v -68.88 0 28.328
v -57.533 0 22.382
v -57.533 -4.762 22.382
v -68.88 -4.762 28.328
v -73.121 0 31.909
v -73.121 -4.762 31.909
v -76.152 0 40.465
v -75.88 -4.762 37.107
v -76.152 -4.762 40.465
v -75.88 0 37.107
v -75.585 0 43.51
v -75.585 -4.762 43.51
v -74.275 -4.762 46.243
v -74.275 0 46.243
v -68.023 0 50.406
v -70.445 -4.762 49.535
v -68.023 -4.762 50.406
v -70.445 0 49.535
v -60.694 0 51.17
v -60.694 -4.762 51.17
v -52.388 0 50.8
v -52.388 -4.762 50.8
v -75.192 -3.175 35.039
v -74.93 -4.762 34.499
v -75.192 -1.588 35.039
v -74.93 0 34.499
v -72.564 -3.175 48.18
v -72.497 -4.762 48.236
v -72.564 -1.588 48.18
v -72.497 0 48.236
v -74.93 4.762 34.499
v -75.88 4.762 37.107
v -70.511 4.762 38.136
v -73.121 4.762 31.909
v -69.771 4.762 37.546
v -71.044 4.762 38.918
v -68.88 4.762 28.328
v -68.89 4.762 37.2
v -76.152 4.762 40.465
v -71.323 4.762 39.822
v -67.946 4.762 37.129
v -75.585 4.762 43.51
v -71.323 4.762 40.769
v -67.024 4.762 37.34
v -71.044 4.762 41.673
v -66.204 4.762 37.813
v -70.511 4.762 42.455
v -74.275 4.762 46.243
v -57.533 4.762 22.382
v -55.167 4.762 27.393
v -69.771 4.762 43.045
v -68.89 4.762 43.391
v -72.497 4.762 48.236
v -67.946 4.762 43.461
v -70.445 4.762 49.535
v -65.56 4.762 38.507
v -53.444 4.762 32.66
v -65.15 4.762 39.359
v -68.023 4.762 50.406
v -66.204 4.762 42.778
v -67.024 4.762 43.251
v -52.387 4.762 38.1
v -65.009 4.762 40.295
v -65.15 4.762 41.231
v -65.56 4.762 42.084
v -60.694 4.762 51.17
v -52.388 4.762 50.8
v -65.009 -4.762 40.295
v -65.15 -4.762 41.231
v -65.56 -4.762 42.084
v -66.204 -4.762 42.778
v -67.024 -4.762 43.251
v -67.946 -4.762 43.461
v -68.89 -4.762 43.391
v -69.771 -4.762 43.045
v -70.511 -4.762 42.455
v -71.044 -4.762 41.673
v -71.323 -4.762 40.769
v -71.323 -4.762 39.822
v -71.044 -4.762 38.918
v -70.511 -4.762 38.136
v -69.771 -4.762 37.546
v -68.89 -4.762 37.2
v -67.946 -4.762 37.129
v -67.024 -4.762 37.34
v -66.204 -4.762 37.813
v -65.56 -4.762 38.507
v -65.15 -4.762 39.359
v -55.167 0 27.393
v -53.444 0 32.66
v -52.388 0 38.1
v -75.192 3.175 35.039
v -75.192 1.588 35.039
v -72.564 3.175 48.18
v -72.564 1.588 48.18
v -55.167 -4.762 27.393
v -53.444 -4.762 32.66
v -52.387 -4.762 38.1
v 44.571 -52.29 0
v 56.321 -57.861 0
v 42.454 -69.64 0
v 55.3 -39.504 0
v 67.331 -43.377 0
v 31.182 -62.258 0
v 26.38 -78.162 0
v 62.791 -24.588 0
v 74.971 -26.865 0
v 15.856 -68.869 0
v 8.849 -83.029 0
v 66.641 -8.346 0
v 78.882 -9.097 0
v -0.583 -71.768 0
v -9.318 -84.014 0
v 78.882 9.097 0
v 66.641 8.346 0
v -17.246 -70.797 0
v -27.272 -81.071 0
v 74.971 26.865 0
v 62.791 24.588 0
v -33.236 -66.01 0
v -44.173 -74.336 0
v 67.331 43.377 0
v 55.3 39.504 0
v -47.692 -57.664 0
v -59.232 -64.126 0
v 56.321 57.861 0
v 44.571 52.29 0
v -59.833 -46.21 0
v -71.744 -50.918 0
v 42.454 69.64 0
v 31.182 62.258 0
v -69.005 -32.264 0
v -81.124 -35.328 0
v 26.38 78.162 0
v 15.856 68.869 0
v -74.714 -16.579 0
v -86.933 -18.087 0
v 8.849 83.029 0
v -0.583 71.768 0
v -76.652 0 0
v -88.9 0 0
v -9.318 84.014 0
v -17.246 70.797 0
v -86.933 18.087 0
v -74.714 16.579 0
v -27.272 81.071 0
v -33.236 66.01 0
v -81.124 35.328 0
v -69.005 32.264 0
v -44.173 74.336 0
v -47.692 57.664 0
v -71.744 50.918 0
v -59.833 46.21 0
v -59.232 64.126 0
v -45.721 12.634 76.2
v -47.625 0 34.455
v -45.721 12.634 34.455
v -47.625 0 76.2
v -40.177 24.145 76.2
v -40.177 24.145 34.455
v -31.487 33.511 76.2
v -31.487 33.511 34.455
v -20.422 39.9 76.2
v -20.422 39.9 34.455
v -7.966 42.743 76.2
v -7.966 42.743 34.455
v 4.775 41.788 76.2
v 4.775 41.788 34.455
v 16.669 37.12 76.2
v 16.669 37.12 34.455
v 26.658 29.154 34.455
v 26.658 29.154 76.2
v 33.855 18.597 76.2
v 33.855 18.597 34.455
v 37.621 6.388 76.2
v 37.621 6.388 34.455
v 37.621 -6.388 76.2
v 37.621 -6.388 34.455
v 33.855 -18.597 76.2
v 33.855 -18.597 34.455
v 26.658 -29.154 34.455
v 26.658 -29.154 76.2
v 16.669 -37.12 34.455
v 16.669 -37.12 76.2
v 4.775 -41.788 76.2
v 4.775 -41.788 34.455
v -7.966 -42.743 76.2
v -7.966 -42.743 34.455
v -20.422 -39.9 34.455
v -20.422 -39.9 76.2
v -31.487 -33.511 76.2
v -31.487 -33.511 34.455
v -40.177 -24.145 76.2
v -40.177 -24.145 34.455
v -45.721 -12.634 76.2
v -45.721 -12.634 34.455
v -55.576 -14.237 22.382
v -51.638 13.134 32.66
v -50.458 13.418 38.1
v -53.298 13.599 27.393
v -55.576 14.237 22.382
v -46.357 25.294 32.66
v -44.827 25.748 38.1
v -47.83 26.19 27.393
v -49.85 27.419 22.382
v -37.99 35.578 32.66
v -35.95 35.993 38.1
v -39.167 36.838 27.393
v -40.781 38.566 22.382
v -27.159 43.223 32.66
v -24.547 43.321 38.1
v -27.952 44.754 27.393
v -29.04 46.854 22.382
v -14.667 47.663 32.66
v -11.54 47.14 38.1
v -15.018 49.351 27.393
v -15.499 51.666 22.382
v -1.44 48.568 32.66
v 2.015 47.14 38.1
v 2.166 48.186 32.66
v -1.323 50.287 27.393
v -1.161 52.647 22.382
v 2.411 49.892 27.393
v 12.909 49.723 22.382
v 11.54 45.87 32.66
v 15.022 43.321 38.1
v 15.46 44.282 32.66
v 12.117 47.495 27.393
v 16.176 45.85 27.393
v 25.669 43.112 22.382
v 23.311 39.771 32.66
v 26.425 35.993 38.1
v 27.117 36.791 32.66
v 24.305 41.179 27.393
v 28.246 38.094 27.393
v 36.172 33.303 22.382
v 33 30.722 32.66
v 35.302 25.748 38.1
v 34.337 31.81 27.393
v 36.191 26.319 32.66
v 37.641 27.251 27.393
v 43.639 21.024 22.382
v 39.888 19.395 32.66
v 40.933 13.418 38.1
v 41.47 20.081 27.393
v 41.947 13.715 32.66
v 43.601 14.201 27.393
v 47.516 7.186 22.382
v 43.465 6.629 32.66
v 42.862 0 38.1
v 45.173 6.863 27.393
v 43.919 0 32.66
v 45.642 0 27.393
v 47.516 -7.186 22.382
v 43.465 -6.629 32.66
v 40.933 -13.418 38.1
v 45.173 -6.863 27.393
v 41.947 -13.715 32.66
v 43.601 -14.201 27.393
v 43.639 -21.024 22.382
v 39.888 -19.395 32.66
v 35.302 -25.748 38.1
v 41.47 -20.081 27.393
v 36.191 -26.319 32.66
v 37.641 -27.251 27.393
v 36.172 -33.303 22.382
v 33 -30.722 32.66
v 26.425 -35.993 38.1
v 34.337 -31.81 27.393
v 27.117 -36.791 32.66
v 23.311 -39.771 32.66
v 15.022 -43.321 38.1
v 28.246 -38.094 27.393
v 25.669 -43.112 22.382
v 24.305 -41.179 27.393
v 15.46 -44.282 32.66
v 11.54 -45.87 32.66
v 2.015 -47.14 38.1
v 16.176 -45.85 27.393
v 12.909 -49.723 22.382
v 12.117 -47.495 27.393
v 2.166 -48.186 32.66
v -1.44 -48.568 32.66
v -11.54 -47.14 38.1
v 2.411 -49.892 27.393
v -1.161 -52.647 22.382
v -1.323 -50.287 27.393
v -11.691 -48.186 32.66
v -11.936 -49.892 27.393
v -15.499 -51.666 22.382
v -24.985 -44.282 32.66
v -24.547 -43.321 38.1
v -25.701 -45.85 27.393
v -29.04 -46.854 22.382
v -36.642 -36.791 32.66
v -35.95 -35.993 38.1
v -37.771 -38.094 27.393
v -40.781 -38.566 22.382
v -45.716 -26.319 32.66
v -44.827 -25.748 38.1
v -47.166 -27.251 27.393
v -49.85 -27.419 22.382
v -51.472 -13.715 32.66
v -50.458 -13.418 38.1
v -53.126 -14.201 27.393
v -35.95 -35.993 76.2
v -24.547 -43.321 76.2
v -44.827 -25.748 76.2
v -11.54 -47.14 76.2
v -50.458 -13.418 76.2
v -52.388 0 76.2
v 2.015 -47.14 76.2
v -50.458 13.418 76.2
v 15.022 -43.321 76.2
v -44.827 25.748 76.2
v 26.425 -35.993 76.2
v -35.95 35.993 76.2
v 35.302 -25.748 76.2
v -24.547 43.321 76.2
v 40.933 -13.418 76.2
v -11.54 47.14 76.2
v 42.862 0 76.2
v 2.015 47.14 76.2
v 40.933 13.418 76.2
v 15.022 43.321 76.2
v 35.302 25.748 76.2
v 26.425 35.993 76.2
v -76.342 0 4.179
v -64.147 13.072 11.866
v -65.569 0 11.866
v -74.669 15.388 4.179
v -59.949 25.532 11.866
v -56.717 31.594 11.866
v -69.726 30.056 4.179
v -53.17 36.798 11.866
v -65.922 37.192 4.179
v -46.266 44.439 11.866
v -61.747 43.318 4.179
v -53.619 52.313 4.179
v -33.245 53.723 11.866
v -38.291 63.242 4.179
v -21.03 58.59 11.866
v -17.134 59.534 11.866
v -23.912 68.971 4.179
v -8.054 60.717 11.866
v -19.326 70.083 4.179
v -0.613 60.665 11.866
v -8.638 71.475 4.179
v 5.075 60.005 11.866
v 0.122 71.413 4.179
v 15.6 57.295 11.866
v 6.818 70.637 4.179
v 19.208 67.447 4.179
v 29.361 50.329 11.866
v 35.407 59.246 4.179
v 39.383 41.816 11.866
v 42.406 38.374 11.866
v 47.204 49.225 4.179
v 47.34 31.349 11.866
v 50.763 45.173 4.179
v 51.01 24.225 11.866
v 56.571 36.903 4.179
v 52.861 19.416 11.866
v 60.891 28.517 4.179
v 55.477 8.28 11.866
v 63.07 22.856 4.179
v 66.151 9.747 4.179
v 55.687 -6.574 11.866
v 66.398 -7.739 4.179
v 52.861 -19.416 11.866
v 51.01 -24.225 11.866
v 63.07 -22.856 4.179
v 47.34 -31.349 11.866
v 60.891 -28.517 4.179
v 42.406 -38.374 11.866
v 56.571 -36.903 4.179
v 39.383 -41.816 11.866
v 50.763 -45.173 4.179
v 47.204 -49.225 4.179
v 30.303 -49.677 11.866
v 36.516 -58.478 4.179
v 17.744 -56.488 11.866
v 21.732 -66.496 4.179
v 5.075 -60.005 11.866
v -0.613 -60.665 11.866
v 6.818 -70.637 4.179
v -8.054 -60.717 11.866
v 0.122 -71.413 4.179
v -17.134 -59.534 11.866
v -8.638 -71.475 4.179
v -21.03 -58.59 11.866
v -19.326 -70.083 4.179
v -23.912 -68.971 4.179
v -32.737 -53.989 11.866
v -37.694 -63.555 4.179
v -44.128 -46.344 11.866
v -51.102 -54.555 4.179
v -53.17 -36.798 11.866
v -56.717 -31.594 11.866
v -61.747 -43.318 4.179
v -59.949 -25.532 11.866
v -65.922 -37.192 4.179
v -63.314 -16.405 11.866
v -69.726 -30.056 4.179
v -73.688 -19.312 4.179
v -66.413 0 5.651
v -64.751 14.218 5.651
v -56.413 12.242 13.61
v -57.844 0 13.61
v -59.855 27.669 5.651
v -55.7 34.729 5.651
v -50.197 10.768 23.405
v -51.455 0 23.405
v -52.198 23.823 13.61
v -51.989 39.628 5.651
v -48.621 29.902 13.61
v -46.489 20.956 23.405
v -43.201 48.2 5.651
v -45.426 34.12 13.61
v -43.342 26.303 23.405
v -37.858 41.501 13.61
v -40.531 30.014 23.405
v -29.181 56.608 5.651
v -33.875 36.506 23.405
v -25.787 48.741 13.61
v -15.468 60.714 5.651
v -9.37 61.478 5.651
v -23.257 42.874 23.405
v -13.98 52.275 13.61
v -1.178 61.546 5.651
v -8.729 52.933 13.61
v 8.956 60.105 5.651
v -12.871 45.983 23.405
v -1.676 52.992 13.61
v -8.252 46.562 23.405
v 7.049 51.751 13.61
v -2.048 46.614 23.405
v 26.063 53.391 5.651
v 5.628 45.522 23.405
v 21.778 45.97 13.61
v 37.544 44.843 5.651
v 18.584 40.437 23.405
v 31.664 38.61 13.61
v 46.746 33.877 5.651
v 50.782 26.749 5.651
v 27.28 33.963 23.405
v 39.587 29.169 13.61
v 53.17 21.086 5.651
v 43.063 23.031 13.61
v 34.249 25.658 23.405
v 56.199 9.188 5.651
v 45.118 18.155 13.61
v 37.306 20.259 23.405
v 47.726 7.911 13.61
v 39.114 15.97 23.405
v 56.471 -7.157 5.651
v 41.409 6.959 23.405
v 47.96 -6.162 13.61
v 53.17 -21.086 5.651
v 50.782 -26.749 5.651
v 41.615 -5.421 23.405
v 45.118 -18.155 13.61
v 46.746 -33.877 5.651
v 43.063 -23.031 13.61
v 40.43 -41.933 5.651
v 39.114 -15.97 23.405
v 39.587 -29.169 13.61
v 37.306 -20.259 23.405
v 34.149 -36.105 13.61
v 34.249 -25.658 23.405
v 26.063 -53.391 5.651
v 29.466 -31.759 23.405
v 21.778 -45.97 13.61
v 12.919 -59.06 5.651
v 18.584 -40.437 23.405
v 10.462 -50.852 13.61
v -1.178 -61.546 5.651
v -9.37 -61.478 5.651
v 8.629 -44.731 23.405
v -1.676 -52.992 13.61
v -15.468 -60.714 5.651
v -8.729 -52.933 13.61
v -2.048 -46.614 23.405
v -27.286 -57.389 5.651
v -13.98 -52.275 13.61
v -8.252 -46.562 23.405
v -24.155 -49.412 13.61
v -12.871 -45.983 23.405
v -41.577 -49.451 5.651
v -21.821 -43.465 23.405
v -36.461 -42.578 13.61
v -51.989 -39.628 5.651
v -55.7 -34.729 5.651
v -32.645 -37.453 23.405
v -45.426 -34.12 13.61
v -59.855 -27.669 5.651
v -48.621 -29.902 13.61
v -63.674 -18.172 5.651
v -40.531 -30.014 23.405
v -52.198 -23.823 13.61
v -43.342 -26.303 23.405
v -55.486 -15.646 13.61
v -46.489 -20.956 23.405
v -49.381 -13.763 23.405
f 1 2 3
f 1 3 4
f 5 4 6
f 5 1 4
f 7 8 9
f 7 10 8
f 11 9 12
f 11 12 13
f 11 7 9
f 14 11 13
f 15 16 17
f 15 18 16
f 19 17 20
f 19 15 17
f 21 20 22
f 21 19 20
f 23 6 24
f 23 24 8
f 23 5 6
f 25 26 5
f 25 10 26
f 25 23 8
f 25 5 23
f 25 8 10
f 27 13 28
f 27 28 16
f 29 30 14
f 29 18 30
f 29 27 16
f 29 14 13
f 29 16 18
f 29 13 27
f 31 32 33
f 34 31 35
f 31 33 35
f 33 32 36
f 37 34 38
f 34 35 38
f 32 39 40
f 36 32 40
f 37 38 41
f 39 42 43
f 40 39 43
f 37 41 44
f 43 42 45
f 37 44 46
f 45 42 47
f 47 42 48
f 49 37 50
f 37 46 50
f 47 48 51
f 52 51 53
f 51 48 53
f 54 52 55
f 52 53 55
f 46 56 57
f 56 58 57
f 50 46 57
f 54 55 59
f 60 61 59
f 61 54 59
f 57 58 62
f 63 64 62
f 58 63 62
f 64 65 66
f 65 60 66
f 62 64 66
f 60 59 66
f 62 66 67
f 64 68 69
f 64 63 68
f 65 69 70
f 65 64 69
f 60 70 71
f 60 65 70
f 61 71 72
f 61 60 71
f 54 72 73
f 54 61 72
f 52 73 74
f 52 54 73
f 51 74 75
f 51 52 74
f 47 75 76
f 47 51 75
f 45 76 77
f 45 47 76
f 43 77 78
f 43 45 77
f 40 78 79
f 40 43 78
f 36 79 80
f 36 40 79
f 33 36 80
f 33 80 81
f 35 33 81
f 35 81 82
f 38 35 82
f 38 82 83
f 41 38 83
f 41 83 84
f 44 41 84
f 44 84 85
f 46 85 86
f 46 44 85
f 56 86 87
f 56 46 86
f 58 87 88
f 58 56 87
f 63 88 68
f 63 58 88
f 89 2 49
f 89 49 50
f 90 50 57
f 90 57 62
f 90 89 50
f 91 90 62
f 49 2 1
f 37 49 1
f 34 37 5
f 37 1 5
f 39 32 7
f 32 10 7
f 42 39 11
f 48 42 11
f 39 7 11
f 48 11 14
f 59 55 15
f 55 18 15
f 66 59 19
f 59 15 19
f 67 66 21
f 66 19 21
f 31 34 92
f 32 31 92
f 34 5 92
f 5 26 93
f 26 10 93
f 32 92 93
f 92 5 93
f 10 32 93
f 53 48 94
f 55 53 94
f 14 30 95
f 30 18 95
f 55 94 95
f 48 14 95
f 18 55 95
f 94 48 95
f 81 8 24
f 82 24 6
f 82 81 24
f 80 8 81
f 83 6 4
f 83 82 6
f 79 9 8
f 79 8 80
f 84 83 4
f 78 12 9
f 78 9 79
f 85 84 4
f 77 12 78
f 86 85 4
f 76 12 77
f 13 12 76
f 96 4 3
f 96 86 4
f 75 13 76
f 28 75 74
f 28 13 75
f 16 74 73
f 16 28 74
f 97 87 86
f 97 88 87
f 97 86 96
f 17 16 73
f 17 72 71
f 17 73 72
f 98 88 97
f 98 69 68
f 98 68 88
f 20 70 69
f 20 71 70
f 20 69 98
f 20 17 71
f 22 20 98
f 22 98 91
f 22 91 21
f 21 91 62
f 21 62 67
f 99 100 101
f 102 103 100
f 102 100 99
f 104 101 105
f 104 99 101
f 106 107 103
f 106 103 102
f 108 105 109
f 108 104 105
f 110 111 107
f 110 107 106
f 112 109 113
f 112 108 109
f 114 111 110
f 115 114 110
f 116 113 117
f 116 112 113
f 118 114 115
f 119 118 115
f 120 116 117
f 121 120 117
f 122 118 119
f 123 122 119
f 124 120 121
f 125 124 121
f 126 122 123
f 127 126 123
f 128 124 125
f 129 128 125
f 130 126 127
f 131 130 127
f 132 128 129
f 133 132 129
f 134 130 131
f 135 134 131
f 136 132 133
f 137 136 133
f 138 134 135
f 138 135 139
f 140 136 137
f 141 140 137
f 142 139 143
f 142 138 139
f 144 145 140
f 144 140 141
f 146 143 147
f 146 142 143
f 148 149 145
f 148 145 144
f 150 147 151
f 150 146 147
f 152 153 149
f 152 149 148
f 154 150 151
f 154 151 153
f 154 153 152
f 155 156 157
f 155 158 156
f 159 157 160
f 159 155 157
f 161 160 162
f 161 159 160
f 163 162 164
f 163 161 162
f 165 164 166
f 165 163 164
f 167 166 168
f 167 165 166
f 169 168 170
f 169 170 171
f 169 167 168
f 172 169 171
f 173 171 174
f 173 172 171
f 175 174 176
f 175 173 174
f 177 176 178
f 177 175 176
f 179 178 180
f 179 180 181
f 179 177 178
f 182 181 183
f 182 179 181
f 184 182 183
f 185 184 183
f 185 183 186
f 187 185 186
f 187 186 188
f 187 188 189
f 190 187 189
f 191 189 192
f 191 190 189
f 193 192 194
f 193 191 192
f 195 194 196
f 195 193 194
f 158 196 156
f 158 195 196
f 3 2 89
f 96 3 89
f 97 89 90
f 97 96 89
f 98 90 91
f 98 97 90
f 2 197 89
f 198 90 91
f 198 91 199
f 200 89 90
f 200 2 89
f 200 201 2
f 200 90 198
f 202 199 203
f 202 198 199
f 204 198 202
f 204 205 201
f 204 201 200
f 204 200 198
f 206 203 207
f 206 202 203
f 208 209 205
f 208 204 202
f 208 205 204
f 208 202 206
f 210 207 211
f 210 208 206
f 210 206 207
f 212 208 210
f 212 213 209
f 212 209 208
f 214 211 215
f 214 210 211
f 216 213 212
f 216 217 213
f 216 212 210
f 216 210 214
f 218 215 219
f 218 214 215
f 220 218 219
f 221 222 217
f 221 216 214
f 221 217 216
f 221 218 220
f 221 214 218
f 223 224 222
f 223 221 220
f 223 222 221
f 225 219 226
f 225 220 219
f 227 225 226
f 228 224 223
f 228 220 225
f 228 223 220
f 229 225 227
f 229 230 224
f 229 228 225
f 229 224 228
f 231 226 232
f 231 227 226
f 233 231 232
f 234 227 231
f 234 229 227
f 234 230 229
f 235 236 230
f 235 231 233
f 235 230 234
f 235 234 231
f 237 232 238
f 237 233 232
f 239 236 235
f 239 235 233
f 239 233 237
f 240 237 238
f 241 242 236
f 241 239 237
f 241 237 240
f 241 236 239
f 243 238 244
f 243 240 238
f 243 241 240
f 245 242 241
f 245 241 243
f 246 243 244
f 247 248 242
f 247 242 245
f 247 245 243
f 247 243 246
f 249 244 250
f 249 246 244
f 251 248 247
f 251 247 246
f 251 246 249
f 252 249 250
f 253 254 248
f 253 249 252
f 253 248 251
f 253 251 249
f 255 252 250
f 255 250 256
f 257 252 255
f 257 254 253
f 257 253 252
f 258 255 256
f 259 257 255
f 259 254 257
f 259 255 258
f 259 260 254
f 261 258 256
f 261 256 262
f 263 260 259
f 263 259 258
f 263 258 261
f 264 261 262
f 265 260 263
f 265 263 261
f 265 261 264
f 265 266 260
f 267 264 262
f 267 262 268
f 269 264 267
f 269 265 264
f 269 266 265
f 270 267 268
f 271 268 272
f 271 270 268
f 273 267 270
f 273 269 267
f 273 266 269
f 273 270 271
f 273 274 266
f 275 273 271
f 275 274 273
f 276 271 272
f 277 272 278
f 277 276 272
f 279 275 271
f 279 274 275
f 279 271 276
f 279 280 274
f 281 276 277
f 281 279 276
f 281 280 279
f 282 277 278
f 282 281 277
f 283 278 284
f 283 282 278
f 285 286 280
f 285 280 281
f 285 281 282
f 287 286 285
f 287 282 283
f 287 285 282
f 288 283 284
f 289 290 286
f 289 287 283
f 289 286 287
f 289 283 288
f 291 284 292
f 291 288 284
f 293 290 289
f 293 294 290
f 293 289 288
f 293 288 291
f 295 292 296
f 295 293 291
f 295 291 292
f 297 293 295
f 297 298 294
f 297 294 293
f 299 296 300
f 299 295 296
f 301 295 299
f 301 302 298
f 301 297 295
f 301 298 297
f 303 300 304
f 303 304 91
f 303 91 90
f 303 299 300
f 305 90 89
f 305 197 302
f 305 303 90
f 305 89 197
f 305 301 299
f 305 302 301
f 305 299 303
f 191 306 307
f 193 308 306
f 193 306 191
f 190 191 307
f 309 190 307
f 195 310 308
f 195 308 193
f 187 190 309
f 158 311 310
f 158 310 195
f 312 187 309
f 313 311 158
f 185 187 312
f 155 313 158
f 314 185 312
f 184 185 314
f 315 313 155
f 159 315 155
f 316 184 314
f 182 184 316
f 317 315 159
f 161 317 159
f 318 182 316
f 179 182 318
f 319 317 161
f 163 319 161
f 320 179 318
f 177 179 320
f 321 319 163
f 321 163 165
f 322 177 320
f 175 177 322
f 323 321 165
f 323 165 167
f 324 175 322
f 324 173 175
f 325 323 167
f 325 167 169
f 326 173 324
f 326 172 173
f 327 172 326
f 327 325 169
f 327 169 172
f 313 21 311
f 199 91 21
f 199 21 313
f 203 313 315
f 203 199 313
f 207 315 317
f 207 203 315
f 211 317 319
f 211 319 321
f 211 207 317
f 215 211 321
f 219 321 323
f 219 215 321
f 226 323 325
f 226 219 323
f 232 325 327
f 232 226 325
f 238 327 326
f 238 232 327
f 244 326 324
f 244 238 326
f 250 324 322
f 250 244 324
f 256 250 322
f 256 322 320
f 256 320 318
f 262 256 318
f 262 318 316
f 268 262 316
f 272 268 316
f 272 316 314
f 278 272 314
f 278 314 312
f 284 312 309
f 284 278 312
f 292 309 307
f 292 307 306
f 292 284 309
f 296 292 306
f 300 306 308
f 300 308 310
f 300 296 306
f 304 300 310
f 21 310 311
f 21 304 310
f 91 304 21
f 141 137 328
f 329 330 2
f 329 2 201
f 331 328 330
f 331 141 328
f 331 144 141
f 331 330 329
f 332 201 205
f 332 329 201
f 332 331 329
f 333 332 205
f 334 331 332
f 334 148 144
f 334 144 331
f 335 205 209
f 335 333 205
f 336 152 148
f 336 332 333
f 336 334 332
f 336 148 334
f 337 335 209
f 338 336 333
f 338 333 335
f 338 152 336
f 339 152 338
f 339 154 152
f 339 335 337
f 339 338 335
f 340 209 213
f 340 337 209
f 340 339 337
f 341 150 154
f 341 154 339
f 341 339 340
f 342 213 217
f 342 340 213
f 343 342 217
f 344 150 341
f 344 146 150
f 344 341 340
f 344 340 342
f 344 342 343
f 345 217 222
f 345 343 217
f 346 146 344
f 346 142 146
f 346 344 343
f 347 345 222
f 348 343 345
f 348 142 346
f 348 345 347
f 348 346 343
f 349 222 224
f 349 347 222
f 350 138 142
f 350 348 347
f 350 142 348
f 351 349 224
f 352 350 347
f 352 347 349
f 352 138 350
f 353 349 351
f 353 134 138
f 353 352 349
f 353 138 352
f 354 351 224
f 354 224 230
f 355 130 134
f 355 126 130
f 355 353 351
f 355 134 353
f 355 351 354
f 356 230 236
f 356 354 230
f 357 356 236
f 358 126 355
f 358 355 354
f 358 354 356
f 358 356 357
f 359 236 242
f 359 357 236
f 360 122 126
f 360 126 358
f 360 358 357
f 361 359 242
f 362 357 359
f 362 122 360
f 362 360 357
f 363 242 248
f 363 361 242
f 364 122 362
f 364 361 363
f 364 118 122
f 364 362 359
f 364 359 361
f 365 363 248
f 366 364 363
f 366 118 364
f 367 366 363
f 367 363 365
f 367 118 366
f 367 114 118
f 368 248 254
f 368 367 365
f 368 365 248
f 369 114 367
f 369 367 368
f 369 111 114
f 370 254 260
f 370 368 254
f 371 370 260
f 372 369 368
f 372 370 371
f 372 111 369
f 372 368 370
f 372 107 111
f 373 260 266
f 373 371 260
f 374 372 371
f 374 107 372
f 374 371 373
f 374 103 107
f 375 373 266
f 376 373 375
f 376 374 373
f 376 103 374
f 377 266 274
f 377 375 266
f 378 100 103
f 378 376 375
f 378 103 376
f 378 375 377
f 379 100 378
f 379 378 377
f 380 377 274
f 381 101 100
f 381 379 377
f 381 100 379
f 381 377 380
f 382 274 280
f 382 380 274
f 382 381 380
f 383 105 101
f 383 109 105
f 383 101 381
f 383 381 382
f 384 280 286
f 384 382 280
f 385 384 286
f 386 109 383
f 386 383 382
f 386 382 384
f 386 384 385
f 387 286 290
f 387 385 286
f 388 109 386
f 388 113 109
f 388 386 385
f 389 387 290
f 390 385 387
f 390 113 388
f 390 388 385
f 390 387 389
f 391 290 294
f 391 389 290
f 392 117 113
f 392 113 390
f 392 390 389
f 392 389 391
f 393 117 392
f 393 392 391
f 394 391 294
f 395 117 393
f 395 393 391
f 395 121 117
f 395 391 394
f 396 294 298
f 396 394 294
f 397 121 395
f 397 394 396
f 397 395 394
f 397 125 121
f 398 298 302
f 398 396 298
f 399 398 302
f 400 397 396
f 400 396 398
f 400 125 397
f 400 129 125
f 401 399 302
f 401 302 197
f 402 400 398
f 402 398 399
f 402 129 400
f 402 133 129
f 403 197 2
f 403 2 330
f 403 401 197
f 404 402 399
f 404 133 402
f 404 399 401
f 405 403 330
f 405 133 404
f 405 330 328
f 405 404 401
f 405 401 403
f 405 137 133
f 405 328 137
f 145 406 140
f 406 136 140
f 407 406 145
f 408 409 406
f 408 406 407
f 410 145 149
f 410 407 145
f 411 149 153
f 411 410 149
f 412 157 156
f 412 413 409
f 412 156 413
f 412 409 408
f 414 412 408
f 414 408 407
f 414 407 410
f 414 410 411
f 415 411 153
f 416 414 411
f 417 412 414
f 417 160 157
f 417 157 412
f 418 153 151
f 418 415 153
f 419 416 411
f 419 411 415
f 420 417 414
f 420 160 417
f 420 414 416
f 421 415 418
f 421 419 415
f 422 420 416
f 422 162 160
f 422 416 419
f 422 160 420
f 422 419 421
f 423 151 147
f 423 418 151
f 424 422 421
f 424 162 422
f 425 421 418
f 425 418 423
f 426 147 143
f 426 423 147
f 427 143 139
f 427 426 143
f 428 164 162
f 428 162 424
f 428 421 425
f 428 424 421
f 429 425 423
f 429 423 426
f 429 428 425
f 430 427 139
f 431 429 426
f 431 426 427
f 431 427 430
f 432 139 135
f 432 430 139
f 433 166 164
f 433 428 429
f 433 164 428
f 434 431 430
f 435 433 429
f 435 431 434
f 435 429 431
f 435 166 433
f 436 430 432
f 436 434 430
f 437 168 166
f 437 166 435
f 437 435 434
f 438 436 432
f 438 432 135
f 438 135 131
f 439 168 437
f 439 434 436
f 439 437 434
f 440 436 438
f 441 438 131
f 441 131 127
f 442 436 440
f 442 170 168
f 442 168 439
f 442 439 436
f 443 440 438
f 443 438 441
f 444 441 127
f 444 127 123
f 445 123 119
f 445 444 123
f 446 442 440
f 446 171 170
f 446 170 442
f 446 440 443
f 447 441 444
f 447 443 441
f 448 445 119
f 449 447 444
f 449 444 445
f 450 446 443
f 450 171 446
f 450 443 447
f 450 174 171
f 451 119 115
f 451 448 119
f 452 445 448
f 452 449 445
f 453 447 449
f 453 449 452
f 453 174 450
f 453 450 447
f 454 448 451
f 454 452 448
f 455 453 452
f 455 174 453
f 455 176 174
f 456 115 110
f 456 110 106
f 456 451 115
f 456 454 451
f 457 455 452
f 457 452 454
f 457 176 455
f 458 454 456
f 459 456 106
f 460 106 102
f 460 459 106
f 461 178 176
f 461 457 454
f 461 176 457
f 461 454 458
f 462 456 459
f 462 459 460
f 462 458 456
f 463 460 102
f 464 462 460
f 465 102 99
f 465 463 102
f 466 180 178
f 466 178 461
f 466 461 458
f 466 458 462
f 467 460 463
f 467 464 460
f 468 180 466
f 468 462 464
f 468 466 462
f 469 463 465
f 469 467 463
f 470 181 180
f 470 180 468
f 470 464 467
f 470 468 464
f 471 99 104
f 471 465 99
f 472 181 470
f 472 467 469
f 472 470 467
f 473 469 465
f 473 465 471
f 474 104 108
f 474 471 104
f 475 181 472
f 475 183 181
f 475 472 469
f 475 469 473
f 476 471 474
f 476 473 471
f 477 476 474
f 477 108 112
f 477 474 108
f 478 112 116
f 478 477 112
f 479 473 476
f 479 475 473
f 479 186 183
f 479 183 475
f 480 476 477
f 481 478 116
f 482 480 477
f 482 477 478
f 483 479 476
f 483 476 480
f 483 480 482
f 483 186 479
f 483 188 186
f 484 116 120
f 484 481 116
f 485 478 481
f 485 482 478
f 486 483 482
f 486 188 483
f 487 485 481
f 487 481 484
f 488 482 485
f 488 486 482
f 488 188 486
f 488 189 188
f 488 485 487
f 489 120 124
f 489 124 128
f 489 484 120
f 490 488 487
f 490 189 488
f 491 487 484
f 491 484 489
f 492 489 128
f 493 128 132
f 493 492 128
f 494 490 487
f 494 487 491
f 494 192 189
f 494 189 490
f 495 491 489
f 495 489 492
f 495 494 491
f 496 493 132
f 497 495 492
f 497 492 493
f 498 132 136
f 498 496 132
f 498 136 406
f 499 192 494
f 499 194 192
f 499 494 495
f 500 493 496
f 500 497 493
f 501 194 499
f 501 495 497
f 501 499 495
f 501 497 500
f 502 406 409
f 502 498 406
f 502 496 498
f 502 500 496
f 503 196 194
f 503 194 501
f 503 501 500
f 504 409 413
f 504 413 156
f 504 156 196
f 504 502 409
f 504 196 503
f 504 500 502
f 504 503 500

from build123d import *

# Parameters (mm, degrees)
F0_R     = 3.175
F2_DEPTH = 4.7625


with BuildPart() as f1:
    # F0 (on Front) → F1 (revolve)
    with BuildSketch(Plane.XZ):
        with BuildLine():
            ThreePointArc((-76.6519159079, 0), (-57.8443054398, 13.6099762046), (-47.625, 34.4552025199))
            Line((-47.625, 34.4552025199), (-47.625, 76.2))
            Line((-47.625, 76.2), (-52.3875, 76.2))
            Line((-52.3875, 76.2), (-52.3875, 50.8))
            Line((-52.3875, 50.8), (-52.3875, 38.1))
            ThreePointArc((-52.3875, 38.1), (-54.2234370352, 29.9996817772), (-57.5327032702, 22.3816389123))
            ThreePointArc((-57.5327032702, 22.3816389123), (-70.6681150923, 7.6195308616), (-88.9, 0))
            Line((-88.9, 0), (-76.6519159079, 0))
        make_face()
    revolve(axis=Axis((-4.7625, 0, 35.1770613343), (0, 0, -1)))

    # F0 (on Front) → F2 (join, symmetric)
    with BuildSketch(Plane.XZ):
        with BuildLine():
            Line((-52.3875, 38.1), (-52.3875, 50.8))
            add(Edge.make_bspline(
                [(-57.5327032702, 22.3816389123), (-65.0873911071, 25.8888650273), (-78.6040150118, 32.1613991723), (-74.6881941056, 52.2718953606), (-60.3173873221, 51.3237170816), (-52.3875, 50.8)],
                knots=[0, 0, 0, 0, 0.3632347305, 0.6485002918, 1, 1, 1, 1], degree=3))
            ThreePointArc((-57.5327032702, 22.3816389123), (-54.2234370352, 29.9996817772), (-52.3875, 38.1))
        make_face()
        with Locations((-68.1837052107, 40.2953475714)):
            Circle(F0_R, mode=Mode.SUBTRACT)
    extrude(amount=F2_DEPTH, both=True)


solid = f1.part
